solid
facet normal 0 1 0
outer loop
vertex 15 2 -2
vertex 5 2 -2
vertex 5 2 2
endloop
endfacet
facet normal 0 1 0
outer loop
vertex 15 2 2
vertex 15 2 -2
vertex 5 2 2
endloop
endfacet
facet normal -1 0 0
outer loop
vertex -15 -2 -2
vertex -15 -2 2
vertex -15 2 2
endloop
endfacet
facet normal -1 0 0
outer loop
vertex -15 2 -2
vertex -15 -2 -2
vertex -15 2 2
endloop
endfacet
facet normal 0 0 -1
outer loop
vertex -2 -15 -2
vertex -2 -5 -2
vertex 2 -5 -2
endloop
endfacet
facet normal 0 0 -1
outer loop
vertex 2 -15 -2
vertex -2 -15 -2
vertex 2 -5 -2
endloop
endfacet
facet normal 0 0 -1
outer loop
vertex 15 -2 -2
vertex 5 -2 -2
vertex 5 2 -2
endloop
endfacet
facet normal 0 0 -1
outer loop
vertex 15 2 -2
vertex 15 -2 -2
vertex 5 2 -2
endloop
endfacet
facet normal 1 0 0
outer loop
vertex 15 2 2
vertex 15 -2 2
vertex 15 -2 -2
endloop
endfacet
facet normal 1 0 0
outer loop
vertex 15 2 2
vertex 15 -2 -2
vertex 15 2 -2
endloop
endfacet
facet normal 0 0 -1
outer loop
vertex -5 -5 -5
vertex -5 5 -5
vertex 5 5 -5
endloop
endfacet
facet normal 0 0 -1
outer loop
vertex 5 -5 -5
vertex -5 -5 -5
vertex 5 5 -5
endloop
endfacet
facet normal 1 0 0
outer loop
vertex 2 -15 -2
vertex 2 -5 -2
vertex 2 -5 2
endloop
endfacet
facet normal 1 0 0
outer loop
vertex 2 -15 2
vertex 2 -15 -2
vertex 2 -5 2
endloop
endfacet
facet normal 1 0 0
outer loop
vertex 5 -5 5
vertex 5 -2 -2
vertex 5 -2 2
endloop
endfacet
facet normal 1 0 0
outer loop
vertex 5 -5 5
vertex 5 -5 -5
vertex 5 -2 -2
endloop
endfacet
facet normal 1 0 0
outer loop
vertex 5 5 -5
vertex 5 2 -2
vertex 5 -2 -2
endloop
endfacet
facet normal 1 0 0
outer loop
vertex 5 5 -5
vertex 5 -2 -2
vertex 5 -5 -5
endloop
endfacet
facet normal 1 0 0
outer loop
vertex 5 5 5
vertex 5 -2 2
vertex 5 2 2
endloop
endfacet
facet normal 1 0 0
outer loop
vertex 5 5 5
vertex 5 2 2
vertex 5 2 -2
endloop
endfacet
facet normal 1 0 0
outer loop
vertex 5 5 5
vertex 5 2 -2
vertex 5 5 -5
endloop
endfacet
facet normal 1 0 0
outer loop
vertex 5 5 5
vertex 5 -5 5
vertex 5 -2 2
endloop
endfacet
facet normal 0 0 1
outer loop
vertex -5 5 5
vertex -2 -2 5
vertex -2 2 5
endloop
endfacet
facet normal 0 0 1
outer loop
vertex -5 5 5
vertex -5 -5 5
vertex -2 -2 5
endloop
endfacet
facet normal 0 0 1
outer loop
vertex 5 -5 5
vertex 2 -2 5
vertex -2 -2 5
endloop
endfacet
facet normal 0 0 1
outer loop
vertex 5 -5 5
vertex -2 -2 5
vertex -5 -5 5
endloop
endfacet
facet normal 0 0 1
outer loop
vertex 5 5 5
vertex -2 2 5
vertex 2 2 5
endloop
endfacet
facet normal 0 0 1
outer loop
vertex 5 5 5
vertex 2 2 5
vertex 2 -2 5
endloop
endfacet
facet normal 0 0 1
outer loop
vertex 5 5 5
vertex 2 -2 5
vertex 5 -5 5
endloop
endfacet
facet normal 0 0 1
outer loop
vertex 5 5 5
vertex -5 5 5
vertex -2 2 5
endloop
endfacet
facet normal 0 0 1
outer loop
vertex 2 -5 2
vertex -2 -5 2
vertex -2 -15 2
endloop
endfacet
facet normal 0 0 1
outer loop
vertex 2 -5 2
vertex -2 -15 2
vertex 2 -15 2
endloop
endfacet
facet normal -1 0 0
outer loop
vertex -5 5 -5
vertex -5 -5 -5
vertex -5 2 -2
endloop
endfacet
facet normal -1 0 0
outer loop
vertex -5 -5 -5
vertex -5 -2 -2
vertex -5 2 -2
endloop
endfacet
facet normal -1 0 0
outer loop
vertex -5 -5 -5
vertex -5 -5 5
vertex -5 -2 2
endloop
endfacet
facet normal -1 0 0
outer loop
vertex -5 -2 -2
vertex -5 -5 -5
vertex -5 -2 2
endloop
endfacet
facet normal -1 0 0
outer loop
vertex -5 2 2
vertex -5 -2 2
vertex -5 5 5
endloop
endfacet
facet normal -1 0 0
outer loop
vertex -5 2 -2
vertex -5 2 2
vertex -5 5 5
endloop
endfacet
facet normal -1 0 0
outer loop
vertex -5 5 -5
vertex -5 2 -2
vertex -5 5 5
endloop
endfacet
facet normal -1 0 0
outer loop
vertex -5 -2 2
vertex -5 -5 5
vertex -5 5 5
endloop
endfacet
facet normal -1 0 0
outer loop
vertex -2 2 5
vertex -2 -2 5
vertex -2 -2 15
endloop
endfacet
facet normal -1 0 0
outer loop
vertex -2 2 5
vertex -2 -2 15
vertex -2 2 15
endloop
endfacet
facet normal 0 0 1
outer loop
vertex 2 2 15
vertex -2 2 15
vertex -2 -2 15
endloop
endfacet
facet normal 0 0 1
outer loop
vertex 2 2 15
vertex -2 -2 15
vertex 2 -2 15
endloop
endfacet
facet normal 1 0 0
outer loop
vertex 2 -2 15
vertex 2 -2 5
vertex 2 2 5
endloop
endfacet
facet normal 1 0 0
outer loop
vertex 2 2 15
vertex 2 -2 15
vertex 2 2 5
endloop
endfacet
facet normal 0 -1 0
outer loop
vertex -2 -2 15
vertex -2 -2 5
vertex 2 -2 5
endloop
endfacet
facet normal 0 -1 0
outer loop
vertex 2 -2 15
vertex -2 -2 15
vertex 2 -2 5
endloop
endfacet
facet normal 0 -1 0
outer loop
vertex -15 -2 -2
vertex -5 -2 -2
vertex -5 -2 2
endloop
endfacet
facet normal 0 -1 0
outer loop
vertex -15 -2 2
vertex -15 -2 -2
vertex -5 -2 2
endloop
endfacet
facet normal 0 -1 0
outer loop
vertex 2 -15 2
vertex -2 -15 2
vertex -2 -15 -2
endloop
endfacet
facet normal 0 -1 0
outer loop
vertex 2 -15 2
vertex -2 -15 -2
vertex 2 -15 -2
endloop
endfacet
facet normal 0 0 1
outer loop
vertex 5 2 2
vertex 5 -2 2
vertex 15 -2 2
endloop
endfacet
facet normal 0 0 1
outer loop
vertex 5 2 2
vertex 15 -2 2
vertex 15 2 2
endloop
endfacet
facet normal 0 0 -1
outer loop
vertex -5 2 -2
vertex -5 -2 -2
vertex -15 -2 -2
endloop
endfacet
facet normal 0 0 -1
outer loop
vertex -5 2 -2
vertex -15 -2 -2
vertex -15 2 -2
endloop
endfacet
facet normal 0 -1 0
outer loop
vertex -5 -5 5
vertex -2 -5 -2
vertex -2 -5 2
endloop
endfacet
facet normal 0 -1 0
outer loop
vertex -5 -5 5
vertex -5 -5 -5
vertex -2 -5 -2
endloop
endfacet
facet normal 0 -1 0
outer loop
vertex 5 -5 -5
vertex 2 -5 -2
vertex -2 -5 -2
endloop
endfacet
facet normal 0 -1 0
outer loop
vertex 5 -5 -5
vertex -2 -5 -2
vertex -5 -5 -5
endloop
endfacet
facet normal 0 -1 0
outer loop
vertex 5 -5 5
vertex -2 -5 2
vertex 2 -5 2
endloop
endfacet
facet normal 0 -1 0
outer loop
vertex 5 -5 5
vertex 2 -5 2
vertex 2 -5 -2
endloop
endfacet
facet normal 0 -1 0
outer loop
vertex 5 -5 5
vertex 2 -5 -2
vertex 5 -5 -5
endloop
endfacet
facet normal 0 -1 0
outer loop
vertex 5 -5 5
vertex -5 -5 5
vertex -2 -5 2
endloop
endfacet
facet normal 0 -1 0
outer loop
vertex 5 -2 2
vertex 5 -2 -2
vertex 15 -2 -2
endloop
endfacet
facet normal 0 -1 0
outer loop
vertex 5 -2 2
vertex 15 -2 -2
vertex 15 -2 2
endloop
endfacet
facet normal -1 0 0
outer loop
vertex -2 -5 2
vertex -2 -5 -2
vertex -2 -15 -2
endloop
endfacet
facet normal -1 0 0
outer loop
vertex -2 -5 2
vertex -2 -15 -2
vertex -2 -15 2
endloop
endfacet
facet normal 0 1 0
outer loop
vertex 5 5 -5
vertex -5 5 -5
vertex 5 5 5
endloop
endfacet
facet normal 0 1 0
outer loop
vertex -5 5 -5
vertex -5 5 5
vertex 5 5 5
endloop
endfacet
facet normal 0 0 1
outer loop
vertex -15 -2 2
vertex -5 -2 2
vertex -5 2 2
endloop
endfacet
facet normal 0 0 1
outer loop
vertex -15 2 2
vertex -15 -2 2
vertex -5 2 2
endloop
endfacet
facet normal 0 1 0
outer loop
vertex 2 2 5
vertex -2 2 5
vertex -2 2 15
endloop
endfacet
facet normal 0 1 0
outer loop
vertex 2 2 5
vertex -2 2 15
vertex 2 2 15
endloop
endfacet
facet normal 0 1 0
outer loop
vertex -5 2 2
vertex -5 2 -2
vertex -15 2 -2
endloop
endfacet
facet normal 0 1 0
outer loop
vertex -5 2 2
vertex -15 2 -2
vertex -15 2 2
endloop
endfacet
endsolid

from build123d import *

# Parameters (mm, degrees)
F0_W     = 10
F0_H     = 10
F1_DEPTH = 5
F2_W     = 4
F2_H     = 4
F3_DEPTH = 15
F4_W     = 4
F4_H     = 4
F5_DEPTH = 15
F6_W     = 4
F6_H     = 4
F7_DEPTH = 15
F8_DEPTH = 15


with BuildPart() as f1:
    # F0 (on Top) → F1 (new body, symmetric)
    with BuildSketch(Plane.XY):
        Rectangle(F0_W, F0_H)
    extrude(amount=F1_DEPTH, both=True)

    # F2 (on Top) → F3 (join)
    with BuildSketch(Plane.XY):
        Rectangle(F2_W, F2_H)
    extrude(amount=F3_DEPTH)

    # F4 (on Front) → F5 (join)
    with BuildSketch(Plane.XZ):
        Rectangle(F4_W, F4_H)
    extrude(amount=F5_DEPTH)

    # F6 (on Right) → F7 (join)
    with BuildSketch(Plane.YZ):
        Rectangle(F6_W, F6_H)
    extrude(amount=F7_DEPTH)

    # F6 (on Right) → F8 (join)
    with BuildSketch(Plane.YZ):
        Rectangle(F6_W, F6_H)
    extrude(amount=-F8_DEPTH)


solid = f1.part
